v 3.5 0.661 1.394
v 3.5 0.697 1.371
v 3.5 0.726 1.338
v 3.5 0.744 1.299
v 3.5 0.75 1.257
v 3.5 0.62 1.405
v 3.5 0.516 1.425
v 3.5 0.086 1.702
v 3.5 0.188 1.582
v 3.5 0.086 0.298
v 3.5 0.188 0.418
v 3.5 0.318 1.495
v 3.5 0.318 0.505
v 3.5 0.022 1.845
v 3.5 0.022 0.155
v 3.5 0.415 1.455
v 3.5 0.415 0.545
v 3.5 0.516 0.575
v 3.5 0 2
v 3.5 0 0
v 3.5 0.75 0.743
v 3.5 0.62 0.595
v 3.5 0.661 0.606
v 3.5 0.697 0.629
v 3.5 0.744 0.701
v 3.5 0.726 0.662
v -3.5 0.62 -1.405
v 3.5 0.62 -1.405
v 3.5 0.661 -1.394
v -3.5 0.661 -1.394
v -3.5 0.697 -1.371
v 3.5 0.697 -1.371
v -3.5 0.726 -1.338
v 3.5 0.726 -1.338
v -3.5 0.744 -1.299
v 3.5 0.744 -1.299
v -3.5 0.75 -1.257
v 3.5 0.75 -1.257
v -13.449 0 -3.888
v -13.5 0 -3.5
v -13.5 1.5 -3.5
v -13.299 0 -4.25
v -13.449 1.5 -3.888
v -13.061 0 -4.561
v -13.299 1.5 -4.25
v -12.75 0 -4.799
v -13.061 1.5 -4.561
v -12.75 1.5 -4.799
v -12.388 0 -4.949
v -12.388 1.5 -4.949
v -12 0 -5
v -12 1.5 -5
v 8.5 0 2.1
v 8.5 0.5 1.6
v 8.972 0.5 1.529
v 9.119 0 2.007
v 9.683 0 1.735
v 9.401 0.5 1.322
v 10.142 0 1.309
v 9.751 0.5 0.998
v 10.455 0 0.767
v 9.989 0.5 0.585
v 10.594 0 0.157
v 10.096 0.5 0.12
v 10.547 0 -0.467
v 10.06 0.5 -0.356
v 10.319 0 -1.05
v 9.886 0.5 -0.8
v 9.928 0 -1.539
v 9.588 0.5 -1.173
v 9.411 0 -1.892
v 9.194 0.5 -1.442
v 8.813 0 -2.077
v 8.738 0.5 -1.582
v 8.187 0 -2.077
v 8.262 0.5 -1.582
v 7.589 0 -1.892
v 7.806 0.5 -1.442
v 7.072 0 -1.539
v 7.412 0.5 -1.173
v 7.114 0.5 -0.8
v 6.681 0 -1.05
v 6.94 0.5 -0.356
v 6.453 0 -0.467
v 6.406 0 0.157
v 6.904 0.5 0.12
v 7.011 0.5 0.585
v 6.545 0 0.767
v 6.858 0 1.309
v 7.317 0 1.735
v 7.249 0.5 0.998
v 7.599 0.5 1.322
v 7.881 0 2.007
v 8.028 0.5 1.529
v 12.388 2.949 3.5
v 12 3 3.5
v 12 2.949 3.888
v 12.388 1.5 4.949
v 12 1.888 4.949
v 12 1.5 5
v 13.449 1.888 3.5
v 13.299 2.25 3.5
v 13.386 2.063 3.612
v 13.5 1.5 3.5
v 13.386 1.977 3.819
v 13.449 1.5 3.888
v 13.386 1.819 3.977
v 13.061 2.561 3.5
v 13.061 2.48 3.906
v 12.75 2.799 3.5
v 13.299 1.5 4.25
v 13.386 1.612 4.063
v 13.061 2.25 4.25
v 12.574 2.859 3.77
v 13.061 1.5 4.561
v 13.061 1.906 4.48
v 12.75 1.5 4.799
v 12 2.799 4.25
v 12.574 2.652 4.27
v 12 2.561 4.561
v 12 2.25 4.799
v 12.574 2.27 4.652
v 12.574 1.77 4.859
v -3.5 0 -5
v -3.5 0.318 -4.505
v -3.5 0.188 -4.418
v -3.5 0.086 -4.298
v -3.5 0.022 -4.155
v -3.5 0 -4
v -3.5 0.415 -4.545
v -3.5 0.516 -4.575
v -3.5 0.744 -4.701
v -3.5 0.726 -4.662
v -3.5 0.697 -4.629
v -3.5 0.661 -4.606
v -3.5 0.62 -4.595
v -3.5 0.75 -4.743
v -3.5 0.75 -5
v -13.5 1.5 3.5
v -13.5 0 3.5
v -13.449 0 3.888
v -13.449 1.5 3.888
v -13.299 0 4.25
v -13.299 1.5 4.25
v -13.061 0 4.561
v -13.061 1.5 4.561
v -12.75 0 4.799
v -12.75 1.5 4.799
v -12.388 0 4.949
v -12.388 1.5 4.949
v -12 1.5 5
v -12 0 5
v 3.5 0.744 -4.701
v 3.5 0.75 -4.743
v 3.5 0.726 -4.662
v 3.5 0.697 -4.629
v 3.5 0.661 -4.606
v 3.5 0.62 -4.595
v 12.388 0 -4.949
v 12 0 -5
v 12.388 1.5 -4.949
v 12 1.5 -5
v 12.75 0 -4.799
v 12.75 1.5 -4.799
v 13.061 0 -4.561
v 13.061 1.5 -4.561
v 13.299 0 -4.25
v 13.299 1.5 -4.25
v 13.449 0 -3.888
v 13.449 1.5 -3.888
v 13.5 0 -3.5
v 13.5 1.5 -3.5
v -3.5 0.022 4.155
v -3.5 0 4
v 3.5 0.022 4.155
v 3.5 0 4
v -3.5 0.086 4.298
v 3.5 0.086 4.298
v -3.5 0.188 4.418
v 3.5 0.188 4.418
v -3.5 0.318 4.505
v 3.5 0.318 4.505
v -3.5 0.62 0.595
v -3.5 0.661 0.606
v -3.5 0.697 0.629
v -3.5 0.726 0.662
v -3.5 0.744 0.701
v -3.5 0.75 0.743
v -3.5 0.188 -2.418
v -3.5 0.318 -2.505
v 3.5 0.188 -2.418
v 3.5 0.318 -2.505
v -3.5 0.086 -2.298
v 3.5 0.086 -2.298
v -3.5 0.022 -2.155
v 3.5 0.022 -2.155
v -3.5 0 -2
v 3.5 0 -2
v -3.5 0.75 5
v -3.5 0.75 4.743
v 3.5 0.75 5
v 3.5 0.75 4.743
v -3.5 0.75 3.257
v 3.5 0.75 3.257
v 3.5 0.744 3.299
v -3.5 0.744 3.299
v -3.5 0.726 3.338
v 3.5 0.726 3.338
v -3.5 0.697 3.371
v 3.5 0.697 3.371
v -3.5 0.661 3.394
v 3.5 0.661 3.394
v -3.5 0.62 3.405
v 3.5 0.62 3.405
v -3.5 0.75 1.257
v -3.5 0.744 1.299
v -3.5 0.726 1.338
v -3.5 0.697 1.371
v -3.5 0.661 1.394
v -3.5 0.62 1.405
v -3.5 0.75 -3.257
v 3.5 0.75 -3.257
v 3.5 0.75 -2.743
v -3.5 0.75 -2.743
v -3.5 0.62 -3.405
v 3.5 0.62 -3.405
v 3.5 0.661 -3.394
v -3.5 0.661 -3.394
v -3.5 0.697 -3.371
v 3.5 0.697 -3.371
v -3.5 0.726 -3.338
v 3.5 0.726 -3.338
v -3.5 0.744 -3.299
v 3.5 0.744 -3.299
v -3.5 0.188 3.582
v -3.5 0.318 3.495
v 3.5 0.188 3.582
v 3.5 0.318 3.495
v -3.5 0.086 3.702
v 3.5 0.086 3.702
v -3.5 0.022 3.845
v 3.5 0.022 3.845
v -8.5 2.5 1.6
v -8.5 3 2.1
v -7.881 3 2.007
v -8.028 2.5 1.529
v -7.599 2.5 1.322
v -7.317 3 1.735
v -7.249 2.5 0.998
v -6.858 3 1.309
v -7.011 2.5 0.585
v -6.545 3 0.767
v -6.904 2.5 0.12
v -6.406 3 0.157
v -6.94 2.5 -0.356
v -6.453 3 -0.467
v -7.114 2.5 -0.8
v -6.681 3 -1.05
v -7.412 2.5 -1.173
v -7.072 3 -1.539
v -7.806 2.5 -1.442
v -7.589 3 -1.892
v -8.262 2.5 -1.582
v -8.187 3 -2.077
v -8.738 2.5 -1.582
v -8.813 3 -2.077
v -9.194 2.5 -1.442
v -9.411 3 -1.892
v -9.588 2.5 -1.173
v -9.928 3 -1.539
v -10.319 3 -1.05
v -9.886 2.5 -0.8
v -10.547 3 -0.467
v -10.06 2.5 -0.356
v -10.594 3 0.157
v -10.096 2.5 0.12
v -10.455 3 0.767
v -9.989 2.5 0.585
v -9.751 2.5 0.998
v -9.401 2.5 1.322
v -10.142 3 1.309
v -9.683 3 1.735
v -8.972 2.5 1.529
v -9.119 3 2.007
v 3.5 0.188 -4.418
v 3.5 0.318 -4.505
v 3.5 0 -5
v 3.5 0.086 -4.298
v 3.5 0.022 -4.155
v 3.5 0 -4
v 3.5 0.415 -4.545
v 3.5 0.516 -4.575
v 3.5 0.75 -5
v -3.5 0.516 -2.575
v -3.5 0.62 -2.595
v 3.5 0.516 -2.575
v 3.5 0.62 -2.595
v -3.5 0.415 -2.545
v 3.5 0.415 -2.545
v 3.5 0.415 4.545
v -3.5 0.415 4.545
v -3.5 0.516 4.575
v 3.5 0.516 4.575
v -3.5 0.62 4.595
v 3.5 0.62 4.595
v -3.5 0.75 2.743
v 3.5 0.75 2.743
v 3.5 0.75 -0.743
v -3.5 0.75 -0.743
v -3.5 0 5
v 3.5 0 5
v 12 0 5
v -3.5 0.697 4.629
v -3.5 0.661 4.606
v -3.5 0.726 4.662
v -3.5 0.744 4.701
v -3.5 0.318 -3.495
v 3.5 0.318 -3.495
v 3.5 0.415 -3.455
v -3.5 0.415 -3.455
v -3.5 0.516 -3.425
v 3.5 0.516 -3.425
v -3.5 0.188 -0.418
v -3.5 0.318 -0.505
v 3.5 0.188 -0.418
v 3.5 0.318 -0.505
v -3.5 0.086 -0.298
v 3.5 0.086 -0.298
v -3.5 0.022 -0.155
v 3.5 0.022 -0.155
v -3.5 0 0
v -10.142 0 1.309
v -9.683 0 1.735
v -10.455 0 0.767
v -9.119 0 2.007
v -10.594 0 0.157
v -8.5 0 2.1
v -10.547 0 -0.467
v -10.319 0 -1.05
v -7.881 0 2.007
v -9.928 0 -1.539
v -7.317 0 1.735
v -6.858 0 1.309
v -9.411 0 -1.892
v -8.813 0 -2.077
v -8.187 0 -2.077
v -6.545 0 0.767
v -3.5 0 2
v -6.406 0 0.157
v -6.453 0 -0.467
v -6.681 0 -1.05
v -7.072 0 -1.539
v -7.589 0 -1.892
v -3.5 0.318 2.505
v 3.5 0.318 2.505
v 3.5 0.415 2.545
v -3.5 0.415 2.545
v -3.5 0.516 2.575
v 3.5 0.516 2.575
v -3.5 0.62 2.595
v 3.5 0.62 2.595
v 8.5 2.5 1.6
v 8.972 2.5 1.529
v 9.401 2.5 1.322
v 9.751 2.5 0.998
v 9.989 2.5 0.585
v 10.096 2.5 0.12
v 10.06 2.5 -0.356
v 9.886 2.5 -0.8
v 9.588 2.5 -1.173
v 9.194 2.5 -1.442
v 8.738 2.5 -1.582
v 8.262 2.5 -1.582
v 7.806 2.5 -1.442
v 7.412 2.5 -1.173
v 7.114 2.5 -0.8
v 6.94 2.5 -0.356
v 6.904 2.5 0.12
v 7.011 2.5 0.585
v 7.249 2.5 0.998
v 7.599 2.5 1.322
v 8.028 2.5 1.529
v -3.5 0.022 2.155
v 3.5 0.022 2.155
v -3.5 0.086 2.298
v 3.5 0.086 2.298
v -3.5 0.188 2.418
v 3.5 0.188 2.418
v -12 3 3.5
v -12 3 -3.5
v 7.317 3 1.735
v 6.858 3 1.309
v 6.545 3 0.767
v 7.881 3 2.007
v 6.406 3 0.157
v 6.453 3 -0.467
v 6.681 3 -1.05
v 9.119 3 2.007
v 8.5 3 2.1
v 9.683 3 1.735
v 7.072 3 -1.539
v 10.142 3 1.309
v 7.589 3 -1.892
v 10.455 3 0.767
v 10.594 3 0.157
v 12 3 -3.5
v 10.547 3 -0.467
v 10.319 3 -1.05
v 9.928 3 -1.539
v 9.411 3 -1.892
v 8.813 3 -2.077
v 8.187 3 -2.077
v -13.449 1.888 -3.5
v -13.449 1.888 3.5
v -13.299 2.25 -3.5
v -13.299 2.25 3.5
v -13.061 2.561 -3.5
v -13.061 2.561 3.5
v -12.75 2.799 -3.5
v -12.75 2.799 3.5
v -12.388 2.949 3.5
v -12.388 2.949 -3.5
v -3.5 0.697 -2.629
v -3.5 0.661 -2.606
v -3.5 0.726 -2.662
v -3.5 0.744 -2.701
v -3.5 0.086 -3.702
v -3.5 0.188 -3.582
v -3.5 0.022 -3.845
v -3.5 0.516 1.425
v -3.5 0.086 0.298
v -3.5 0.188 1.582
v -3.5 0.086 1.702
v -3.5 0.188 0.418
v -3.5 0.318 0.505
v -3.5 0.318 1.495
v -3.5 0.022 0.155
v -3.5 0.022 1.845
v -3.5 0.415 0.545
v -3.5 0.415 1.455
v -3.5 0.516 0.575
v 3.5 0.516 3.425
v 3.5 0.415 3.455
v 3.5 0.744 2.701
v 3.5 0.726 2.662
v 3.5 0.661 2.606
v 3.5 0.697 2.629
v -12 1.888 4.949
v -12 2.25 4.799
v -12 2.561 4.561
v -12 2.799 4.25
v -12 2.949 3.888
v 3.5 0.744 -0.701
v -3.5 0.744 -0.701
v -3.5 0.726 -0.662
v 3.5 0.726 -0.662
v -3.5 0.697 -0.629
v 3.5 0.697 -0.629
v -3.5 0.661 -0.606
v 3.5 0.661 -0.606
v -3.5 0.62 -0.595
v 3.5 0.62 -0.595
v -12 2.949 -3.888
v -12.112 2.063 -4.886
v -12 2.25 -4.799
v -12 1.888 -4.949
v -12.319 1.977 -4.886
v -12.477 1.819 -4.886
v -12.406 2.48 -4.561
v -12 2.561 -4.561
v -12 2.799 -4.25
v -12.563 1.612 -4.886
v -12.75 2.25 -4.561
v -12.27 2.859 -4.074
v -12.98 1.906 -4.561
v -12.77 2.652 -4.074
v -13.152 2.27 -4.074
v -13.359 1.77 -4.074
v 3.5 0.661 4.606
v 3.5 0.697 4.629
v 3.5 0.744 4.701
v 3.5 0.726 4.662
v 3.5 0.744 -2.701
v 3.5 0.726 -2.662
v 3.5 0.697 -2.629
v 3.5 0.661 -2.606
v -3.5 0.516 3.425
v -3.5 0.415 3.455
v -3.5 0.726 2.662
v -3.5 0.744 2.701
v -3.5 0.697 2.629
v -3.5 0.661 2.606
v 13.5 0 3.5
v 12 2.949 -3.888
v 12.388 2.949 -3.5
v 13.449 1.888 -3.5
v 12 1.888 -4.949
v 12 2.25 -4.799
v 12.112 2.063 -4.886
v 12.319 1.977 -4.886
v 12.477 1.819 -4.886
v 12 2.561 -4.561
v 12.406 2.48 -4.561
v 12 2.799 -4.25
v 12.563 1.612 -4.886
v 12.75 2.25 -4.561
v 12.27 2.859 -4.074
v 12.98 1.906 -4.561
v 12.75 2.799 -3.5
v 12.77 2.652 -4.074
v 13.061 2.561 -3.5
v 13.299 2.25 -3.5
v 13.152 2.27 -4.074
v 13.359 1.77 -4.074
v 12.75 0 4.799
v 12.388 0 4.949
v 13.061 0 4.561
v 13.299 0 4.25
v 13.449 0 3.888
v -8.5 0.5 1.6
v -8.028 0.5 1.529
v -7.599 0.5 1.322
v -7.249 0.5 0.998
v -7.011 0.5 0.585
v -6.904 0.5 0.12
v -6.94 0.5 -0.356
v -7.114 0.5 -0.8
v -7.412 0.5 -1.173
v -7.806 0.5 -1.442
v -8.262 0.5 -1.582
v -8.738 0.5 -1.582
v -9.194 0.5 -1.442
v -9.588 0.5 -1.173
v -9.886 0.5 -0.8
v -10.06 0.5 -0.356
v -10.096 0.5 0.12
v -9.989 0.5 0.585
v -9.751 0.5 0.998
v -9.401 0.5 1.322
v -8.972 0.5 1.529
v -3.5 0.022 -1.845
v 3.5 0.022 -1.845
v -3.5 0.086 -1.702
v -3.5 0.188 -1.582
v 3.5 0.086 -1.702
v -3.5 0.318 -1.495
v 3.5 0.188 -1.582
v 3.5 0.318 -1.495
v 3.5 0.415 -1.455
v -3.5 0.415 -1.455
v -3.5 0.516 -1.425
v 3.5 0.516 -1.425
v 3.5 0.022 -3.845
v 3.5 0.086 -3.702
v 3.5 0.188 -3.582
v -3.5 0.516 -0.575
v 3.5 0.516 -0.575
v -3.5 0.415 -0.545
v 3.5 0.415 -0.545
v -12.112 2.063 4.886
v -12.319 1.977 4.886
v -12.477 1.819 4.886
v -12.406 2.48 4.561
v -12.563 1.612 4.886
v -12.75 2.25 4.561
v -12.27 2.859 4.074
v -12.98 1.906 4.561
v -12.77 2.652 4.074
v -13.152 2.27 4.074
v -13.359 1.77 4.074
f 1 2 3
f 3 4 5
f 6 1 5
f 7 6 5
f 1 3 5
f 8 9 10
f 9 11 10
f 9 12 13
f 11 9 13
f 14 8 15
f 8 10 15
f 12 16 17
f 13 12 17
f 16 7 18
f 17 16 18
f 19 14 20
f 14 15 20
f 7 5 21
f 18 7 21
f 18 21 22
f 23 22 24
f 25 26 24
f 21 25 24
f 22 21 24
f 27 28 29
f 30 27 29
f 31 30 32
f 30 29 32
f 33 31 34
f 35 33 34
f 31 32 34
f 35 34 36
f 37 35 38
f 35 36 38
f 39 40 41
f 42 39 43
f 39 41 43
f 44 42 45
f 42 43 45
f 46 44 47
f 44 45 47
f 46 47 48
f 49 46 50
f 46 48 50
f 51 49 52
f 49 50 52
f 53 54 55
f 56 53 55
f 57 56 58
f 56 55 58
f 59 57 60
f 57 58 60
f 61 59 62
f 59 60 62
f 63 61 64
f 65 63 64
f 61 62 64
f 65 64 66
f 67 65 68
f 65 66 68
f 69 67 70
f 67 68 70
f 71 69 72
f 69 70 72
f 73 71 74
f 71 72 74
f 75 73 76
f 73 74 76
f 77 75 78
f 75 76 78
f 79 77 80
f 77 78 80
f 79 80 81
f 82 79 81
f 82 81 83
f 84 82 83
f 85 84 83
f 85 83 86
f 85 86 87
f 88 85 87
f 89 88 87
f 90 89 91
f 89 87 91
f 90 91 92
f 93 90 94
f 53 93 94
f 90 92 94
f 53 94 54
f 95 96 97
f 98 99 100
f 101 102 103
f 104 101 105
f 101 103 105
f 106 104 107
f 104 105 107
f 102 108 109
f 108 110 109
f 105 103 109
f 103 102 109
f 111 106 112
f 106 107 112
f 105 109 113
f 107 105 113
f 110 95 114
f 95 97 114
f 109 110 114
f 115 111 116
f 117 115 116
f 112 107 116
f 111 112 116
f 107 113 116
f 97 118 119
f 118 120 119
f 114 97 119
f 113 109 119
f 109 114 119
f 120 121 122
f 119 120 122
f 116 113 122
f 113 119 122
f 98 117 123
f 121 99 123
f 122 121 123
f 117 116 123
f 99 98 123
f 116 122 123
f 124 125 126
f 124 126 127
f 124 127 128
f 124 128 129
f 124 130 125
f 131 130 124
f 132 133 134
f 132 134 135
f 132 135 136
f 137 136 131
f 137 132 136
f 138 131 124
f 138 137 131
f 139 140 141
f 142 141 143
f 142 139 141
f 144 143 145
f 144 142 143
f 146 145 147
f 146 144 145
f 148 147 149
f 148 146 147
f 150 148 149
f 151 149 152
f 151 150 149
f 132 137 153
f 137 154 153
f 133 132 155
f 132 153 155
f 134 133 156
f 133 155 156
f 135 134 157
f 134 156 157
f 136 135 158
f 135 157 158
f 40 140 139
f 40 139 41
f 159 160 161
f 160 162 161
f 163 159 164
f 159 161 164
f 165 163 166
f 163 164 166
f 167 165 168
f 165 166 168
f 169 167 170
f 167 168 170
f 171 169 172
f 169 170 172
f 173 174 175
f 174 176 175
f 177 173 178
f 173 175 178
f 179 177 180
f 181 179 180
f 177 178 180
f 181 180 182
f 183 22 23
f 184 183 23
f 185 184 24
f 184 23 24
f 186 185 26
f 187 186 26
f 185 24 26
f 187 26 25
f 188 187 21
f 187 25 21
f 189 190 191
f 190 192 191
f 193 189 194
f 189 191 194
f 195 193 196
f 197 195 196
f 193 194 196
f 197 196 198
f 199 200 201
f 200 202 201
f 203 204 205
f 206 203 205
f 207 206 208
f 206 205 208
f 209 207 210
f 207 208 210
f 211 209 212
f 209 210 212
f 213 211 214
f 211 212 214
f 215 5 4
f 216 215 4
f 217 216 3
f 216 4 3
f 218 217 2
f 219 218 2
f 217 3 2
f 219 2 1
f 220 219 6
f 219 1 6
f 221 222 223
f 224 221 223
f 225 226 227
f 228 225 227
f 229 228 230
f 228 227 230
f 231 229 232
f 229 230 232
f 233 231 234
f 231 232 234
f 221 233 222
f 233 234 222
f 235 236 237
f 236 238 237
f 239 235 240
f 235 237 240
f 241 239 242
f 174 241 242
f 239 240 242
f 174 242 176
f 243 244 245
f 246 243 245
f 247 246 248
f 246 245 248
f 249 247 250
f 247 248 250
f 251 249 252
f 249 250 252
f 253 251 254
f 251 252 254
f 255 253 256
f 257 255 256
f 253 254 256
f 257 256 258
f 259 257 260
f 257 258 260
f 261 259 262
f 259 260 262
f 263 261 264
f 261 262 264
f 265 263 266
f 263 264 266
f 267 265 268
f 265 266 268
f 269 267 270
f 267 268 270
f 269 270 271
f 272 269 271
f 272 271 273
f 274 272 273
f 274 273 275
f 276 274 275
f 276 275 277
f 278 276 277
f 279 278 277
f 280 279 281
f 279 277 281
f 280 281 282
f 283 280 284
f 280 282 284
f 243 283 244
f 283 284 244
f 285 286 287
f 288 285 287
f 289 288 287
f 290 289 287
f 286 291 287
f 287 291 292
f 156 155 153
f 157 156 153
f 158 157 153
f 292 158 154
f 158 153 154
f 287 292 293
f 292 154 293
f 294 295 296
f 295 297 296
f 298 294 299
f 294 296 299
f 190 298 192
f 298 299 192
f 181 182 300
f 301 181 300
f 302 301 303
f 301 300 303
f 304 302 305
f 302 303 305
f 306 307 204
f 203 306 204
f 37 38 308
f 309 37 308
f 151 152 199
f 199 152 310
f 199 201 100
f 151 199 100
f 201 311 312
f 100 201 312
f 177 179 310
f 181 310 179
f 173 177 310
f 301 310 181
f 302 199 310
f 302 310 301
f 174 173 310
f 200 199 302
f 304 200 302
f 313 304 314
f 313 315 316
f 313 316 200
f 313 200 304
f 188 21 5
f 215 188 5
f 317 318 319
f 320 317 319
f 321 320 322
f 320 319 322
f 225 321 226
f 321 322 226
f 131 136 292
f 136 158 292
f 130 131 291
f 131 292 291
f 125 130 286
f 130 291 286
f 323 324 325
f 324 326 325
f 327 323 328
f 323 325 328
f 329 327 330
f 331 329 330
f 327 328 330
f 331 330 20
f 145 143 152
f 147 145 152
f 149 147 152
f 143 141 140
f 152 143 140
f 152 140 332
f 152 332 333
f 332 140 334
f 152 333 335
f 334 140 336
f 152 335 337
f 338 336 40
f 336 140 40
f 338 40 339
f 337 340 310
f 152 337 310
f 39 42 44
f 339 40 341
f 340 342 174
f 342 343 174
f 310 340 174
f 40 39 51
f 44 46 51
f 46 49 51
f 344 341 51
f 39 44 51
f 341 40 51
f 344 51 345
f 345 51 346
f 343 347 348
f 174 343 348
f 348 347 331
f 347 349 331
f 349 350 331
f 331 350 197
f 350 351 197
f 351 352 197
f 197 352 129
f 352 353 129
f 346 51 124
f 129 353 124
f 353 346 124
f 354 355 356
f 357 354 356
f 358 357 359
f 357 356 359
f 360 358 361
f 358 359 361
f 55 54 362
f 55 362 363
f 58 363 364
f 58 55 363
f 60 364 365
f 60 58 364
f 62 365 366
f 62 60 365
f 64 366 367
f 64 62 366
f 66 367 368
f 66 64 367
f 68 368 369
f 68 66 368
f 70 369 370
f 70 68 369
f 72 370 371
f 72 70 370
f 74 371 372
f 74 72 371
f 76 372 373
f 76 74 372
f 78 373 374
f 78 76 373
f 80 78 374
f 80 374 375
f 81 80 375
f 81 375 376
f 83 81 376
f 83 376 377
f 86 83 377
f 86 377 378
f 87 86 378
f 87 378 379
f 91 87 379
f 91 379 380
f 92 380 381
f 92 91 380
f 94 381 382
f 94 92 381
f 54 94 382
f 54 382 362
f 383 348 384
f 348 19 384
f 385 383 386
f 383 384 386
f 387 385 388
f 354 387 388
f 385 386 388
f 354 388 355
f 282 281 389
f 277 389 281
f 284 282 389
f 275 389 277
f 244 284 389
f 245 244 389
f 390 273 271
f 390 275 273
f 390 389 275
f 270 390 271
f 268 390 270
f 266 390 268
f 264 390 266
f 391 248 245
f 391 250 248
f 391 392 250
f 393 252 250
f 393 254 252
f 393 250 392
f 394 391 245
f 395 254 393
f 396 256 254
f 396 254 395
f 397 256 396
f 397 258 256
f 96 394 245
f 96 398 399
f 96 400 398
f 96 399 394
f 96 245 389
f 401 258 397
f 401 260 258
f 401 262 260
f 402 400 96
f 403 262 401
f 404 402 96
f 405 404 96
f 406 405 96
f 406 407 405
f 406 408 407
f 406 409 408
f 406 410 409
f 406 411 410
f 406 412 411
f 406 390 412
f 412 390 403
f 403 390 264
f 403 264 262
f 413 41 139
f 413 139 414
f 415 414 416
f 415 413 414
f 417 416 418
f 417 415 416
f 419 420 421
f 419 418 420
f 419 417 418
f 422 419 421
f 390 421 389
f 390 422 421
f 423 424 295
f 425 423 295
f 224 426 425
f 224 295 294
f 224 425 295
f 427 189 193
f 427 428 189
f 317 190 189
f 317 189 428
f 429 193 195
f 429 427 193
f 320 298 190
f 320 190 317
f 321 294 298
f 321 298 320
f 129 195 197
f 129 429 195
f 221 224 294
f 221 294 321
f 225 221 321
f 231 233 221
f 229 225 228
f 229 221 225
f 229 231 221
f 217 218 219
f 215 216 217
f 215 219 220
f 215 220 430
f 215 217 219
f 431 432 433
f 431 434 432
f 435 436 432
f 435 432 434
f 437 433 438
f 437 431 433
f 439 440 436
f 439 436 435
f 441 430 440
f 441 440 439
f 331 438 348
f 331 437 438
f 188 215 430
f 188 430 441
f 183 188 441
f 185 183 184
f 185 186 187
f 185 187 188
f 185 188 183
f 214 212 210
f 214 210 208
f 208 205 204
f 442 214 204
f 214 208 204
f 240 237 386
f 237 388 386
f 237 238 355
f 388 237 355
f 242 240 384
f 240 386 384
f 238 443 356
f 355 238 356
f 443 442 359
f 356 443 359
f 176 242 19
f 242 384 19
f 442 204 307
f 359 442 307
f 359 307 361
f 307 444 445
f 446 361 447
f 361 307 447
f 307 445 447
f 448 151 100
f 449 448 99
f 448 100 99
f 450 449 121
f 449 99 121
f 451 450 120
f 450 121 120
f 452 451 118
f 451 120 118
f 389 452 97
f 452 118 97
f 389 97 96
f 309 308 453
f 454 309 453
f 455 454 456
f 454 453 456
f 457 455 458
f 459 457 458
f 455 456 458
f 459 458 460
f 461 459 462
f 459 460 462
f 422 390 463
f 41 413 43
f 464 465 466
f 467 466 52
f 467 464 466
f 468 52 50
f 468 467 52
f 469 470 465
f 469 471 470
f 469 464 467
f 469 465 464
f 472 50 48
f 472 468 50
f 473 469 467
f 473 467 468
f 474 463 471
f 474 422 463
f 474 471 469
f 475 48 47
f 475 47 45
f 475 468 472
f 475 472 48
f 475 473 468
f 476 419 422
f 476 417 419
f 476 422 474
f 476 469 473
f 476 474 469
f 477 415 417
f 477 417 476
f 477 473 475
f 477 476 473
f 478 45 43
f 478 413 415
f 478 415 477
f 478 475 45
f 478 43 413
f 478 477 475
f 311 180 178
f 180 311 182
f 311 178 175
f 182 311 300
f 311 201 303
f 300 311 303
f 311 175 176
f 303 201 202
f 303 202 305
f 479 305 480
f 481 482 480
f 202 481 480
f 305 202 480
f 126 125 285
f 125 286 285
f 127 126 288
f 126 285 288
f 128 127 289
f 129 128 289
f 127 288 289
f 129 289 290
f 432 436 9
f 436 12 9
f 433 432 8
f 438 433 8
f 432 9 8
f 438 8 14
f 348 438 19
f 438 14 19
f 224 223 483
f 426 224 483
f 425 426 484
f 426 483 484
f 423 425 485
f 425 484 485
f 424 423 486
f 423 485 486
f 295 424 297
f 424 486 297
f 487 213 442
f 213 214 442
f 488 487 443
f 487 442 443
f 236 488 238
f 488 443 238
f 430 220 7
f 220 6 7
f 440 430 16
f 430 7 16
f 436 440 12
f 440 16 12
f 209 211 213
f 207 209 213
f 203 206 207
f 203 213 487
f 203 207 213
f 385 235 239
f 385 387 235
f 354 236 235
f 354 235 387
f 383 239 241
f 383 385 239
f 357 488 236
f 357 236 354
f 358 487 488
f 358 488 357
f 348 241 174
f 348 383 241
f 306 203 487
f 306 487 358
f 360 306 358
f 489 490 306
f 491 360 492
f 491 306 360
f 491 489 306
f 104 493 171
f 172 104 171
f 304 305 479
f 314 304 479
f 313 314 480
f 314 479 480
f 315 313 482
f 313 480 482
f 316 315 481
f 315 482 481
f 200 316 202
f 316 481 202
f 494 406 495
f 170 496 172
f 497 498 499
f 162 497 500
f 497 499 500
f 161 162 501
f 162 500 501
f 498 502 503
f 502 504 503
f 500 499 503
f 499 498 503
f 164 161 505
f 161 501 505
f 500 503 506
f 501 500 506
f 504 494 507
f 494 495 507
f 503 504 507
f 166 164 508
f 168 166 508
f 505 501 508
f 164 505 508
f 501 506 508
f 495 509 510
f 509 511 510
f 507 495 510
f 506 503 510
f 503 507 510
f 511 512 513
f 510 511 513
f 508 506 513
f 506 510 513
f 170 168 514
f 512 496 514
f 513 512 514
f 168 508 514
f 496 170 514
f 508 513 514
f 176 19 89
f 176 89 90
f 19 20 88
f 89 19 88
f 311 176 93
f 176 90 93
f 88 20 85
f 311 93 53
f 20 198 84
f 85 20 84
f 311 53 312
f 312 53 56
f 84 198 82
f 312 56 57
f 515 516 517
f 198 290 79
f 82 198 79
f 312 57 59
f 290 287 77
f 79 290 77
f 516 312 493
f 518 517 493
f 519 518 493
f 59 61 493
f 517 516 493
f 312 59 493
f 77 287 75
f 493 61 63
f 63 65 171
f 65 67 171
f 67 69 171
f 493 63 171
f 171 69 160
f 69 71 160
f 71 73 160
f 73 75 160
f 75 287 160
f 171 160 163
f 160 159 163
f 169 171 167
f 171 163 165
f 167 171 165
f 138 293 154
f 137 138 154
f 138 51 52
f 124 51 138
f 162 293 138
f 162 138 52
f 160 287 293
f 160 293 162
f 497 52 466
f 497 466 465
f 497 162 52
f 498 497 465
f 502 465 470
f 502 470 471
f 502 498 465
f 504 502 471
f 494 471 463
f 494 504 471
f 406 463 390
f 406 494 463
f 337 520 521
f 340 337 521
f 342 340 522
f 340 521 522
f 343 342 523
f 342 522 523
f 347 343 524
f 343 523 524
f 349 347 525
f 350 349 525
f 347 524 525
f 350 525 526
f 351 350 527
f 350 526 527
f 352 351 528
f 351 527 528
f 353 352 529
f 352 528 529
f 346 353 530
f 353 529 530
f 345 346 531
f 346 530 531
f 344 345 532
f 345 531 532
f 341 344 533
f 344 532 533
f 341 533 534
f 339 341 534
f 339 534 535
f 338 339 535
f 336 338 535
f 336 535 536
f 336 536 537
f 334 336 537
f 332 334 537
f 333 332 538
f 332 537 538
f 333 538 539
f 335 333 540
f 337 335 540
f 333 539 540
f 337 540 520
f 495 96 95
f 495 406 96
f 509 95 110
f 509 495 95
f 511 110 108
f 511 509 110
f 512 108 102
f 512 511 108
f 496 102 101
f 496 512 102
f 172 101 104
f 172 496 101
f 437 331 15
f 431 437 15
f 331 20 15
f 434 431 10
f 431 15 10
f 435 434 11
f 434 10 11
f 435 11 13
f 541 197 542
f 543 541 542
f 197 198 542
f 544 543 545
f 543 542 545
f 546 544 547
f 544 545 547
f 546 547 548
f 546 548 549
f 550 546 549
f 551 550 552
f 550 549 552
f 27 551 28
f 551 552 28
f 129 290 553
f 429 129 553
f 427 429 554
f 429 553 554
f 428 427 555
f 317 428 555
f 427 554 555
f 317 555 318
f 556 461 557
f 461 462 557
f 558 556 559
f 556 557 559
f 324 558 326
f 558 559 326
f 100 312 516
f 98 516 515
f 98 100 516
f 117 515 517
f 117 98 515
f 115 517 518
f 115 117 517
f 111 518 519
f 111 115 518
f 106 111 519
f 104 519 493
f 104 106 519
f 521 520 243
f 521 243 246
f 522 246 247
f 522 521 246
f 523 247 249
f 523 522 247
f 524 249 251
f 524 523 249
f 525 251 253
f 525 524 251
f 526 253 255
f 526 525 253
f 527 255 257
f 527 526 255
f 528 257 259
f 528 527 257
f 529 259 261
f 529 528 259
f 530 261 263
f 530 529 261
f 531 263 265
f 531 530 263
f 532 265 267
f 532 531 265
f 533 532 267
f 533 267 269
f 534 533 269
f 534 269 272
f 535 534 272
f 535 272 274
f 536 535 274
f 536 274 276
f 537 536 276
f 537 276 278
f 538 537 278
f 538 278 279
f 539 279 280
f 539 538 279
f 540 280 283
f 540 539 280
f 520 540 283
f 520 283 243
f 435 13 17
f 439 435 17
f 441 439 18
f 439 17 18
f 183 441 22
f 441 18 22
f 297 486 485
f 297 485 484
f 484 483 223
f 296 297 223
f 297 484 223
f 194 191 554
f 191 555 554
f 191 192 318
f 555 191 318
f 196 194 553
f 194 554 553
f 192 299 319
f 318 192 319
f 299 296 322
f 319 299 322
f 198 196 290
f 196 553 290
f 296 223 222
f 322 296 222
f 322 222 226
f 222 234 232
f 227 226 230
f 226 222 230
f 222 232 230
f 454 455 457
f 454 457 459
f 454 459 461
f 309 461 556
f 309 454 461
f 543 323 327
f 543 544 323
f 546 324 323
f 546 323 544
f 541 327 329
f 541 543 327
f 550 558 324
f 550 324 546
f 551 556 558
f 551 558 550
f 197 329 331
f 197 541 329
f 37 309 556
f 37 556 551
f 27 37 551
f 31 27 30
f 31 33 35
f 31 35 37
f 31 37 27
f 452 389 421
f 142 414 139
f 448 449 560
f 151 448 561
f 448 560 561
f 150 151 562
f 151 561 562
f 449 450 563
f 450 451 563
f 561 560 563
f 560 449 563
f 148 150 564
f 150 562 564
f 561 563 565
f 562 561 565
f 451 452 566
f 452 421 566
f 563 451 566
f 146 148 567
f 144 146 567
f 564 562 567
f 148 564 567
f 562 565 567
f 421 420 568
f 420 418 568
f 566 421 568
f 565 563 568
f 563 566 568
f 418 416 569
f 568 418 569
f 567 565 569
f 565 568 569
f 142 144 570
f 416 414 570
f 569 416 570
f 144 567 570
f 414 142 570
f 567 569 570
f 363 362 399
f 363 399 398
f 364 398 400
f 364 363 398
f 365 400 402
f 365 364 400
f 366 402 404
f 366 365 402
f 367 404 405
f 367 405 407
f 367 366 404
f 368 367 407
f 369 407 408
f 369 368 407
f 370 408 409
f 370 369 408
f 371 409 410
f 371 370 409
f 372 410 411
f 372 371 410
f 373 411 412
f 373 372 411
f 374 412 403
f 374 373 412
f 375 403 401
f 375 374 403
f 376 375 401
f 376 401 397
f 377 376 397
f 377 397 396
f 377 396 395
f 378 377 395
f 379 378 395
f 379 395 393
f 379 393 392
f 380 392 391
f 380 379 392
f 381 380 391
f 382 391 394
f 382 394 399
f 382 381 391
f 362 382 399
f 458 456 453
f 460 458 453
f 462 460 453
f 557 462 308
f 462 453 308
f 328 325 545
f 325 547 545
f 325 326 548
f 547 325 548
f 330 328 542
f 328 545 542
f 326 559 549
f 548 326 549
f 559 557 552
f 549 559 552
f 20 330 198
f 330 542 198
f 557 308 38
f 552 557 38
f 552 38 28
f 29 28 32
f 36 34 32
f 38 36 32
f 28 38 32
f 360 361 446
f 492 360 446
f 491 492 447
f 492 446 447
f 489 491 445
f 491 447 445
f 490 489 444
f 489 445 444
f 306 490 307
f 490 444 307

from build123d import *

# Parameters (mm, degrees)
SKETCH_1_W          = 27
SKETCH_1_H          = 10
SKETCH_1_R          = 1.6
EXTRUDE_1_DEPTH     = 3
CUT_EXTRUDE_1_DEPTH = 3.5
FILLET_1_R          = 1.5
CHAMFER_1_SIZE      = 0.5


with BuildPart() as part:
    # Эскиз1 → Бобышка-Вытянуть1 (new body)
    with BuildSketch(Plane(origin=(0, 0, 0), x_dir=(1, 0, 0), z_dir=(0, 1, 0))):
        Rectangle(SKETCH_1_W, SKETCH_1_H)
        with Locations(Location((-8.5, 0, 0), (0, 0, 270))):
            Circle(SKETCH_1_R, mode=Mode.SUBTRACT)
        with Locations(Location((8.5, 0, 0), (0, 0, 270))):
            Circle(SKETCH_1_R, mode=Mode.SUBTRACT)
    extrude(amount=EXTRUDE_1_DEPTH)

    # Эскиз2 → Вырез-Вытянуть1 (cut, symmetric)
    with BuildSketch(Plane(origin=(0, 0, 0), x_dir=(0, 0, -1), z_dir=(1, 0, 0))):
        with BuildLine():
            ThreePointArc((-3.494902022, 0.318181818), (-3.701518997, 0.086176097), (-4, 0))
            Line((-4, 0), (-2, 0))
            ThreePointArc((-2, 0), (-2.298481003, 0.086176097), (-2.505097978, 0.318181818))
            ThreePointArc((-2.505097978, 0.318181818), (-2.56176419, 0.46533442), (-2.594594195, 0.619565217))
            ThreePointArc((-2.594594195, 0.619565217), (-2.644405657, 0.712771412), (-2.743312728, 0.75))
            Line((-2.743312728, 0.75), (-3.256687272, 0.75))
            ThreePointArc((-3.256687272, 0.75), (-3.355594343, 0.712771412), (-3.405405805, 0.619565217))
            ThreePointArc((-3.405405805, 0.619565217), (-3.43823581, 0.46533442), (-3.494902022, 0.318181818))
        make_face()
        with BuildLine():
            ThreePointArc((-4.594594195, 0.619565217), (-4.644405657, 0.712771412), (-4.743312728, 0.75))
            Line((-4.743312728, 0.75), (-5, 0.75))
            Line((-5, 0.75), (-5, 0))
            Line((-5, 0), (-4, 0))
            ThreePointArc((-4, 0), (-4.298481003, 0.086176097), (-4.505097978, 0.318181818))
            ThreePointArc((-4.505097978, 0.318181818), (-4.56176419, 0.46533442), (-4.594594195, 0.619565217))
        make_face()
        with BuildLine():
            ThreePointArc((-1.494902022, 0.318181818), (-1.701518997, 0.086176097), (-2, 0))
            Line((-2, 0), (0, 0))
            ThreePointArc((0, 0), (-0.298481003, 0.086176097), (-0.505097978, 0.318181818))
            ThreePointArc((-0.505097978, 0.318181818), (-0.56176419, 0.46533442), (-0.594594195, 0.619565217))
            ThreePointArc((-0.594594195, 0.619565217), (-0.644405657, 0.712771412), (-0.743312728, 0.75))
            Line((-0.743312728, 0.75), (-1.256687272, 0.75))
            ThreePointArc((-1.256687272, 0.75), (-1.355594343, 0.712771412), (-1.405405805, 0.619565217))
            ThreePointArc((-1.405405805, 0.619565217), (-1.43823581, 0.46533442), (-1.494902022, 0.318181818))
        make_face()
        with BuildLine():
            ThreePointArc((0.505097978, 0.318181818), (0.298481003, 0.086176097), (0, 0))
            Line((0, 0), (2, 0))
            ThreePointArc((2, 0), (1.701518997, 0.086176097), (1.494902022, 0.318181818))
            ThreePointArc((1.494902022, 0.318181818), (1.43823581, 0.46533442), (1.405405805, 0.619565217))
            ThreePointArc((1.405405805, 0.619565217), (1.355594343, 0.712771412), (1.256687272, 0.75))
            Line((1.256687272, 0.75), (0.743312728, 0.75))
            ThreePointArc((0.743312728, 0.75), (0.644405657, 0.712771412), (0.594594195, 0.619565217))
            ThreePointArc((0.594594195, 0.619565217), (0.56176419, 0.46533442), (0.505097978, 0.318181818))
        make_face()
        with BuildLine():
            ThreePointArc((2.505097978, 0.318181818), (2.298481003, 0.086176097), (2, 0))
            Line((2, 0), (4, 0))
            ThreePointArc((4, 0), (3.701518997, 0.086176097), (3.494902022, 0.318181818))
            ThreePointArc((3.494902022, 0.318181818), (3.43823581, 0.46533442), (3.405405805, 0.619565217))
            ThreePointArc((3.405405805, 0.619565217), (3.355594343, 0.712771412), (3.256687272, 0.75))
            Line((3.256687272, 0.75), (2.743312728, 0.75))
            ThreePointArc((2.743312728, 0.75), (2.644405657, 0.712771412), (2.594594195, 0.619565217))
            ThreePointArc((2.594594195, 0.619565217), (2.56176419, 0.46533442), (2.505097978, 0.318181818))
        make_face()
        with BuildLine():
            ThreePointArc((4.505097978, 0.318181818), (4.298481003, 0.086176097), (4, 0))
            Line((4, 0), (5, 0))
            Line((5, 0), (5, 0.75))
            Line((5, 0.75), (4.743312728, 0.75))
            ThreePointArc((4.743312728, 0.75), (4.644405657, 0.712771412), (4.594594195, 0.619565217))
            ThreePointArc((4.594594195, 0.619565217), (4.56176419, 0.46533442), (4.505097978, 0.318181818))
        make_face()
    extrude(amount=CUT_EXTRUDE_1_DEPTH, both=True, mode=Mode.SUBTRACT)

    # Скругление1
    fillet_1_edges = [part.edges().sort_by_distance(p)[0] for p in [
        (-13.5, 3, 0),
        (0, 3, 5),
        (13.5, 3, 0),
        (0, 3, -5),
        (13.5, 1.5, 5),
        (-13.5, 1.5, 5),
        (-13.5, 1.5, -5),
        (13.5, 1.5, -5),
    ]]
    fillet(fillet_1_edges, radius=FILLET_1_R)

    # Фаска1
    chamfer_1_edges = [part.edges().sort_by_distance(p)[0] for p in [
        (-8.5, 0, -1.6),
        (-8.5, 3, -1.6),
        (8.5, 0, -1.6),
        (8.5, 3, -1.6),
    ]]
    chamfer(chamfer_1_edges, length=CHAMFER_1_SIZE)


solid = part.part
